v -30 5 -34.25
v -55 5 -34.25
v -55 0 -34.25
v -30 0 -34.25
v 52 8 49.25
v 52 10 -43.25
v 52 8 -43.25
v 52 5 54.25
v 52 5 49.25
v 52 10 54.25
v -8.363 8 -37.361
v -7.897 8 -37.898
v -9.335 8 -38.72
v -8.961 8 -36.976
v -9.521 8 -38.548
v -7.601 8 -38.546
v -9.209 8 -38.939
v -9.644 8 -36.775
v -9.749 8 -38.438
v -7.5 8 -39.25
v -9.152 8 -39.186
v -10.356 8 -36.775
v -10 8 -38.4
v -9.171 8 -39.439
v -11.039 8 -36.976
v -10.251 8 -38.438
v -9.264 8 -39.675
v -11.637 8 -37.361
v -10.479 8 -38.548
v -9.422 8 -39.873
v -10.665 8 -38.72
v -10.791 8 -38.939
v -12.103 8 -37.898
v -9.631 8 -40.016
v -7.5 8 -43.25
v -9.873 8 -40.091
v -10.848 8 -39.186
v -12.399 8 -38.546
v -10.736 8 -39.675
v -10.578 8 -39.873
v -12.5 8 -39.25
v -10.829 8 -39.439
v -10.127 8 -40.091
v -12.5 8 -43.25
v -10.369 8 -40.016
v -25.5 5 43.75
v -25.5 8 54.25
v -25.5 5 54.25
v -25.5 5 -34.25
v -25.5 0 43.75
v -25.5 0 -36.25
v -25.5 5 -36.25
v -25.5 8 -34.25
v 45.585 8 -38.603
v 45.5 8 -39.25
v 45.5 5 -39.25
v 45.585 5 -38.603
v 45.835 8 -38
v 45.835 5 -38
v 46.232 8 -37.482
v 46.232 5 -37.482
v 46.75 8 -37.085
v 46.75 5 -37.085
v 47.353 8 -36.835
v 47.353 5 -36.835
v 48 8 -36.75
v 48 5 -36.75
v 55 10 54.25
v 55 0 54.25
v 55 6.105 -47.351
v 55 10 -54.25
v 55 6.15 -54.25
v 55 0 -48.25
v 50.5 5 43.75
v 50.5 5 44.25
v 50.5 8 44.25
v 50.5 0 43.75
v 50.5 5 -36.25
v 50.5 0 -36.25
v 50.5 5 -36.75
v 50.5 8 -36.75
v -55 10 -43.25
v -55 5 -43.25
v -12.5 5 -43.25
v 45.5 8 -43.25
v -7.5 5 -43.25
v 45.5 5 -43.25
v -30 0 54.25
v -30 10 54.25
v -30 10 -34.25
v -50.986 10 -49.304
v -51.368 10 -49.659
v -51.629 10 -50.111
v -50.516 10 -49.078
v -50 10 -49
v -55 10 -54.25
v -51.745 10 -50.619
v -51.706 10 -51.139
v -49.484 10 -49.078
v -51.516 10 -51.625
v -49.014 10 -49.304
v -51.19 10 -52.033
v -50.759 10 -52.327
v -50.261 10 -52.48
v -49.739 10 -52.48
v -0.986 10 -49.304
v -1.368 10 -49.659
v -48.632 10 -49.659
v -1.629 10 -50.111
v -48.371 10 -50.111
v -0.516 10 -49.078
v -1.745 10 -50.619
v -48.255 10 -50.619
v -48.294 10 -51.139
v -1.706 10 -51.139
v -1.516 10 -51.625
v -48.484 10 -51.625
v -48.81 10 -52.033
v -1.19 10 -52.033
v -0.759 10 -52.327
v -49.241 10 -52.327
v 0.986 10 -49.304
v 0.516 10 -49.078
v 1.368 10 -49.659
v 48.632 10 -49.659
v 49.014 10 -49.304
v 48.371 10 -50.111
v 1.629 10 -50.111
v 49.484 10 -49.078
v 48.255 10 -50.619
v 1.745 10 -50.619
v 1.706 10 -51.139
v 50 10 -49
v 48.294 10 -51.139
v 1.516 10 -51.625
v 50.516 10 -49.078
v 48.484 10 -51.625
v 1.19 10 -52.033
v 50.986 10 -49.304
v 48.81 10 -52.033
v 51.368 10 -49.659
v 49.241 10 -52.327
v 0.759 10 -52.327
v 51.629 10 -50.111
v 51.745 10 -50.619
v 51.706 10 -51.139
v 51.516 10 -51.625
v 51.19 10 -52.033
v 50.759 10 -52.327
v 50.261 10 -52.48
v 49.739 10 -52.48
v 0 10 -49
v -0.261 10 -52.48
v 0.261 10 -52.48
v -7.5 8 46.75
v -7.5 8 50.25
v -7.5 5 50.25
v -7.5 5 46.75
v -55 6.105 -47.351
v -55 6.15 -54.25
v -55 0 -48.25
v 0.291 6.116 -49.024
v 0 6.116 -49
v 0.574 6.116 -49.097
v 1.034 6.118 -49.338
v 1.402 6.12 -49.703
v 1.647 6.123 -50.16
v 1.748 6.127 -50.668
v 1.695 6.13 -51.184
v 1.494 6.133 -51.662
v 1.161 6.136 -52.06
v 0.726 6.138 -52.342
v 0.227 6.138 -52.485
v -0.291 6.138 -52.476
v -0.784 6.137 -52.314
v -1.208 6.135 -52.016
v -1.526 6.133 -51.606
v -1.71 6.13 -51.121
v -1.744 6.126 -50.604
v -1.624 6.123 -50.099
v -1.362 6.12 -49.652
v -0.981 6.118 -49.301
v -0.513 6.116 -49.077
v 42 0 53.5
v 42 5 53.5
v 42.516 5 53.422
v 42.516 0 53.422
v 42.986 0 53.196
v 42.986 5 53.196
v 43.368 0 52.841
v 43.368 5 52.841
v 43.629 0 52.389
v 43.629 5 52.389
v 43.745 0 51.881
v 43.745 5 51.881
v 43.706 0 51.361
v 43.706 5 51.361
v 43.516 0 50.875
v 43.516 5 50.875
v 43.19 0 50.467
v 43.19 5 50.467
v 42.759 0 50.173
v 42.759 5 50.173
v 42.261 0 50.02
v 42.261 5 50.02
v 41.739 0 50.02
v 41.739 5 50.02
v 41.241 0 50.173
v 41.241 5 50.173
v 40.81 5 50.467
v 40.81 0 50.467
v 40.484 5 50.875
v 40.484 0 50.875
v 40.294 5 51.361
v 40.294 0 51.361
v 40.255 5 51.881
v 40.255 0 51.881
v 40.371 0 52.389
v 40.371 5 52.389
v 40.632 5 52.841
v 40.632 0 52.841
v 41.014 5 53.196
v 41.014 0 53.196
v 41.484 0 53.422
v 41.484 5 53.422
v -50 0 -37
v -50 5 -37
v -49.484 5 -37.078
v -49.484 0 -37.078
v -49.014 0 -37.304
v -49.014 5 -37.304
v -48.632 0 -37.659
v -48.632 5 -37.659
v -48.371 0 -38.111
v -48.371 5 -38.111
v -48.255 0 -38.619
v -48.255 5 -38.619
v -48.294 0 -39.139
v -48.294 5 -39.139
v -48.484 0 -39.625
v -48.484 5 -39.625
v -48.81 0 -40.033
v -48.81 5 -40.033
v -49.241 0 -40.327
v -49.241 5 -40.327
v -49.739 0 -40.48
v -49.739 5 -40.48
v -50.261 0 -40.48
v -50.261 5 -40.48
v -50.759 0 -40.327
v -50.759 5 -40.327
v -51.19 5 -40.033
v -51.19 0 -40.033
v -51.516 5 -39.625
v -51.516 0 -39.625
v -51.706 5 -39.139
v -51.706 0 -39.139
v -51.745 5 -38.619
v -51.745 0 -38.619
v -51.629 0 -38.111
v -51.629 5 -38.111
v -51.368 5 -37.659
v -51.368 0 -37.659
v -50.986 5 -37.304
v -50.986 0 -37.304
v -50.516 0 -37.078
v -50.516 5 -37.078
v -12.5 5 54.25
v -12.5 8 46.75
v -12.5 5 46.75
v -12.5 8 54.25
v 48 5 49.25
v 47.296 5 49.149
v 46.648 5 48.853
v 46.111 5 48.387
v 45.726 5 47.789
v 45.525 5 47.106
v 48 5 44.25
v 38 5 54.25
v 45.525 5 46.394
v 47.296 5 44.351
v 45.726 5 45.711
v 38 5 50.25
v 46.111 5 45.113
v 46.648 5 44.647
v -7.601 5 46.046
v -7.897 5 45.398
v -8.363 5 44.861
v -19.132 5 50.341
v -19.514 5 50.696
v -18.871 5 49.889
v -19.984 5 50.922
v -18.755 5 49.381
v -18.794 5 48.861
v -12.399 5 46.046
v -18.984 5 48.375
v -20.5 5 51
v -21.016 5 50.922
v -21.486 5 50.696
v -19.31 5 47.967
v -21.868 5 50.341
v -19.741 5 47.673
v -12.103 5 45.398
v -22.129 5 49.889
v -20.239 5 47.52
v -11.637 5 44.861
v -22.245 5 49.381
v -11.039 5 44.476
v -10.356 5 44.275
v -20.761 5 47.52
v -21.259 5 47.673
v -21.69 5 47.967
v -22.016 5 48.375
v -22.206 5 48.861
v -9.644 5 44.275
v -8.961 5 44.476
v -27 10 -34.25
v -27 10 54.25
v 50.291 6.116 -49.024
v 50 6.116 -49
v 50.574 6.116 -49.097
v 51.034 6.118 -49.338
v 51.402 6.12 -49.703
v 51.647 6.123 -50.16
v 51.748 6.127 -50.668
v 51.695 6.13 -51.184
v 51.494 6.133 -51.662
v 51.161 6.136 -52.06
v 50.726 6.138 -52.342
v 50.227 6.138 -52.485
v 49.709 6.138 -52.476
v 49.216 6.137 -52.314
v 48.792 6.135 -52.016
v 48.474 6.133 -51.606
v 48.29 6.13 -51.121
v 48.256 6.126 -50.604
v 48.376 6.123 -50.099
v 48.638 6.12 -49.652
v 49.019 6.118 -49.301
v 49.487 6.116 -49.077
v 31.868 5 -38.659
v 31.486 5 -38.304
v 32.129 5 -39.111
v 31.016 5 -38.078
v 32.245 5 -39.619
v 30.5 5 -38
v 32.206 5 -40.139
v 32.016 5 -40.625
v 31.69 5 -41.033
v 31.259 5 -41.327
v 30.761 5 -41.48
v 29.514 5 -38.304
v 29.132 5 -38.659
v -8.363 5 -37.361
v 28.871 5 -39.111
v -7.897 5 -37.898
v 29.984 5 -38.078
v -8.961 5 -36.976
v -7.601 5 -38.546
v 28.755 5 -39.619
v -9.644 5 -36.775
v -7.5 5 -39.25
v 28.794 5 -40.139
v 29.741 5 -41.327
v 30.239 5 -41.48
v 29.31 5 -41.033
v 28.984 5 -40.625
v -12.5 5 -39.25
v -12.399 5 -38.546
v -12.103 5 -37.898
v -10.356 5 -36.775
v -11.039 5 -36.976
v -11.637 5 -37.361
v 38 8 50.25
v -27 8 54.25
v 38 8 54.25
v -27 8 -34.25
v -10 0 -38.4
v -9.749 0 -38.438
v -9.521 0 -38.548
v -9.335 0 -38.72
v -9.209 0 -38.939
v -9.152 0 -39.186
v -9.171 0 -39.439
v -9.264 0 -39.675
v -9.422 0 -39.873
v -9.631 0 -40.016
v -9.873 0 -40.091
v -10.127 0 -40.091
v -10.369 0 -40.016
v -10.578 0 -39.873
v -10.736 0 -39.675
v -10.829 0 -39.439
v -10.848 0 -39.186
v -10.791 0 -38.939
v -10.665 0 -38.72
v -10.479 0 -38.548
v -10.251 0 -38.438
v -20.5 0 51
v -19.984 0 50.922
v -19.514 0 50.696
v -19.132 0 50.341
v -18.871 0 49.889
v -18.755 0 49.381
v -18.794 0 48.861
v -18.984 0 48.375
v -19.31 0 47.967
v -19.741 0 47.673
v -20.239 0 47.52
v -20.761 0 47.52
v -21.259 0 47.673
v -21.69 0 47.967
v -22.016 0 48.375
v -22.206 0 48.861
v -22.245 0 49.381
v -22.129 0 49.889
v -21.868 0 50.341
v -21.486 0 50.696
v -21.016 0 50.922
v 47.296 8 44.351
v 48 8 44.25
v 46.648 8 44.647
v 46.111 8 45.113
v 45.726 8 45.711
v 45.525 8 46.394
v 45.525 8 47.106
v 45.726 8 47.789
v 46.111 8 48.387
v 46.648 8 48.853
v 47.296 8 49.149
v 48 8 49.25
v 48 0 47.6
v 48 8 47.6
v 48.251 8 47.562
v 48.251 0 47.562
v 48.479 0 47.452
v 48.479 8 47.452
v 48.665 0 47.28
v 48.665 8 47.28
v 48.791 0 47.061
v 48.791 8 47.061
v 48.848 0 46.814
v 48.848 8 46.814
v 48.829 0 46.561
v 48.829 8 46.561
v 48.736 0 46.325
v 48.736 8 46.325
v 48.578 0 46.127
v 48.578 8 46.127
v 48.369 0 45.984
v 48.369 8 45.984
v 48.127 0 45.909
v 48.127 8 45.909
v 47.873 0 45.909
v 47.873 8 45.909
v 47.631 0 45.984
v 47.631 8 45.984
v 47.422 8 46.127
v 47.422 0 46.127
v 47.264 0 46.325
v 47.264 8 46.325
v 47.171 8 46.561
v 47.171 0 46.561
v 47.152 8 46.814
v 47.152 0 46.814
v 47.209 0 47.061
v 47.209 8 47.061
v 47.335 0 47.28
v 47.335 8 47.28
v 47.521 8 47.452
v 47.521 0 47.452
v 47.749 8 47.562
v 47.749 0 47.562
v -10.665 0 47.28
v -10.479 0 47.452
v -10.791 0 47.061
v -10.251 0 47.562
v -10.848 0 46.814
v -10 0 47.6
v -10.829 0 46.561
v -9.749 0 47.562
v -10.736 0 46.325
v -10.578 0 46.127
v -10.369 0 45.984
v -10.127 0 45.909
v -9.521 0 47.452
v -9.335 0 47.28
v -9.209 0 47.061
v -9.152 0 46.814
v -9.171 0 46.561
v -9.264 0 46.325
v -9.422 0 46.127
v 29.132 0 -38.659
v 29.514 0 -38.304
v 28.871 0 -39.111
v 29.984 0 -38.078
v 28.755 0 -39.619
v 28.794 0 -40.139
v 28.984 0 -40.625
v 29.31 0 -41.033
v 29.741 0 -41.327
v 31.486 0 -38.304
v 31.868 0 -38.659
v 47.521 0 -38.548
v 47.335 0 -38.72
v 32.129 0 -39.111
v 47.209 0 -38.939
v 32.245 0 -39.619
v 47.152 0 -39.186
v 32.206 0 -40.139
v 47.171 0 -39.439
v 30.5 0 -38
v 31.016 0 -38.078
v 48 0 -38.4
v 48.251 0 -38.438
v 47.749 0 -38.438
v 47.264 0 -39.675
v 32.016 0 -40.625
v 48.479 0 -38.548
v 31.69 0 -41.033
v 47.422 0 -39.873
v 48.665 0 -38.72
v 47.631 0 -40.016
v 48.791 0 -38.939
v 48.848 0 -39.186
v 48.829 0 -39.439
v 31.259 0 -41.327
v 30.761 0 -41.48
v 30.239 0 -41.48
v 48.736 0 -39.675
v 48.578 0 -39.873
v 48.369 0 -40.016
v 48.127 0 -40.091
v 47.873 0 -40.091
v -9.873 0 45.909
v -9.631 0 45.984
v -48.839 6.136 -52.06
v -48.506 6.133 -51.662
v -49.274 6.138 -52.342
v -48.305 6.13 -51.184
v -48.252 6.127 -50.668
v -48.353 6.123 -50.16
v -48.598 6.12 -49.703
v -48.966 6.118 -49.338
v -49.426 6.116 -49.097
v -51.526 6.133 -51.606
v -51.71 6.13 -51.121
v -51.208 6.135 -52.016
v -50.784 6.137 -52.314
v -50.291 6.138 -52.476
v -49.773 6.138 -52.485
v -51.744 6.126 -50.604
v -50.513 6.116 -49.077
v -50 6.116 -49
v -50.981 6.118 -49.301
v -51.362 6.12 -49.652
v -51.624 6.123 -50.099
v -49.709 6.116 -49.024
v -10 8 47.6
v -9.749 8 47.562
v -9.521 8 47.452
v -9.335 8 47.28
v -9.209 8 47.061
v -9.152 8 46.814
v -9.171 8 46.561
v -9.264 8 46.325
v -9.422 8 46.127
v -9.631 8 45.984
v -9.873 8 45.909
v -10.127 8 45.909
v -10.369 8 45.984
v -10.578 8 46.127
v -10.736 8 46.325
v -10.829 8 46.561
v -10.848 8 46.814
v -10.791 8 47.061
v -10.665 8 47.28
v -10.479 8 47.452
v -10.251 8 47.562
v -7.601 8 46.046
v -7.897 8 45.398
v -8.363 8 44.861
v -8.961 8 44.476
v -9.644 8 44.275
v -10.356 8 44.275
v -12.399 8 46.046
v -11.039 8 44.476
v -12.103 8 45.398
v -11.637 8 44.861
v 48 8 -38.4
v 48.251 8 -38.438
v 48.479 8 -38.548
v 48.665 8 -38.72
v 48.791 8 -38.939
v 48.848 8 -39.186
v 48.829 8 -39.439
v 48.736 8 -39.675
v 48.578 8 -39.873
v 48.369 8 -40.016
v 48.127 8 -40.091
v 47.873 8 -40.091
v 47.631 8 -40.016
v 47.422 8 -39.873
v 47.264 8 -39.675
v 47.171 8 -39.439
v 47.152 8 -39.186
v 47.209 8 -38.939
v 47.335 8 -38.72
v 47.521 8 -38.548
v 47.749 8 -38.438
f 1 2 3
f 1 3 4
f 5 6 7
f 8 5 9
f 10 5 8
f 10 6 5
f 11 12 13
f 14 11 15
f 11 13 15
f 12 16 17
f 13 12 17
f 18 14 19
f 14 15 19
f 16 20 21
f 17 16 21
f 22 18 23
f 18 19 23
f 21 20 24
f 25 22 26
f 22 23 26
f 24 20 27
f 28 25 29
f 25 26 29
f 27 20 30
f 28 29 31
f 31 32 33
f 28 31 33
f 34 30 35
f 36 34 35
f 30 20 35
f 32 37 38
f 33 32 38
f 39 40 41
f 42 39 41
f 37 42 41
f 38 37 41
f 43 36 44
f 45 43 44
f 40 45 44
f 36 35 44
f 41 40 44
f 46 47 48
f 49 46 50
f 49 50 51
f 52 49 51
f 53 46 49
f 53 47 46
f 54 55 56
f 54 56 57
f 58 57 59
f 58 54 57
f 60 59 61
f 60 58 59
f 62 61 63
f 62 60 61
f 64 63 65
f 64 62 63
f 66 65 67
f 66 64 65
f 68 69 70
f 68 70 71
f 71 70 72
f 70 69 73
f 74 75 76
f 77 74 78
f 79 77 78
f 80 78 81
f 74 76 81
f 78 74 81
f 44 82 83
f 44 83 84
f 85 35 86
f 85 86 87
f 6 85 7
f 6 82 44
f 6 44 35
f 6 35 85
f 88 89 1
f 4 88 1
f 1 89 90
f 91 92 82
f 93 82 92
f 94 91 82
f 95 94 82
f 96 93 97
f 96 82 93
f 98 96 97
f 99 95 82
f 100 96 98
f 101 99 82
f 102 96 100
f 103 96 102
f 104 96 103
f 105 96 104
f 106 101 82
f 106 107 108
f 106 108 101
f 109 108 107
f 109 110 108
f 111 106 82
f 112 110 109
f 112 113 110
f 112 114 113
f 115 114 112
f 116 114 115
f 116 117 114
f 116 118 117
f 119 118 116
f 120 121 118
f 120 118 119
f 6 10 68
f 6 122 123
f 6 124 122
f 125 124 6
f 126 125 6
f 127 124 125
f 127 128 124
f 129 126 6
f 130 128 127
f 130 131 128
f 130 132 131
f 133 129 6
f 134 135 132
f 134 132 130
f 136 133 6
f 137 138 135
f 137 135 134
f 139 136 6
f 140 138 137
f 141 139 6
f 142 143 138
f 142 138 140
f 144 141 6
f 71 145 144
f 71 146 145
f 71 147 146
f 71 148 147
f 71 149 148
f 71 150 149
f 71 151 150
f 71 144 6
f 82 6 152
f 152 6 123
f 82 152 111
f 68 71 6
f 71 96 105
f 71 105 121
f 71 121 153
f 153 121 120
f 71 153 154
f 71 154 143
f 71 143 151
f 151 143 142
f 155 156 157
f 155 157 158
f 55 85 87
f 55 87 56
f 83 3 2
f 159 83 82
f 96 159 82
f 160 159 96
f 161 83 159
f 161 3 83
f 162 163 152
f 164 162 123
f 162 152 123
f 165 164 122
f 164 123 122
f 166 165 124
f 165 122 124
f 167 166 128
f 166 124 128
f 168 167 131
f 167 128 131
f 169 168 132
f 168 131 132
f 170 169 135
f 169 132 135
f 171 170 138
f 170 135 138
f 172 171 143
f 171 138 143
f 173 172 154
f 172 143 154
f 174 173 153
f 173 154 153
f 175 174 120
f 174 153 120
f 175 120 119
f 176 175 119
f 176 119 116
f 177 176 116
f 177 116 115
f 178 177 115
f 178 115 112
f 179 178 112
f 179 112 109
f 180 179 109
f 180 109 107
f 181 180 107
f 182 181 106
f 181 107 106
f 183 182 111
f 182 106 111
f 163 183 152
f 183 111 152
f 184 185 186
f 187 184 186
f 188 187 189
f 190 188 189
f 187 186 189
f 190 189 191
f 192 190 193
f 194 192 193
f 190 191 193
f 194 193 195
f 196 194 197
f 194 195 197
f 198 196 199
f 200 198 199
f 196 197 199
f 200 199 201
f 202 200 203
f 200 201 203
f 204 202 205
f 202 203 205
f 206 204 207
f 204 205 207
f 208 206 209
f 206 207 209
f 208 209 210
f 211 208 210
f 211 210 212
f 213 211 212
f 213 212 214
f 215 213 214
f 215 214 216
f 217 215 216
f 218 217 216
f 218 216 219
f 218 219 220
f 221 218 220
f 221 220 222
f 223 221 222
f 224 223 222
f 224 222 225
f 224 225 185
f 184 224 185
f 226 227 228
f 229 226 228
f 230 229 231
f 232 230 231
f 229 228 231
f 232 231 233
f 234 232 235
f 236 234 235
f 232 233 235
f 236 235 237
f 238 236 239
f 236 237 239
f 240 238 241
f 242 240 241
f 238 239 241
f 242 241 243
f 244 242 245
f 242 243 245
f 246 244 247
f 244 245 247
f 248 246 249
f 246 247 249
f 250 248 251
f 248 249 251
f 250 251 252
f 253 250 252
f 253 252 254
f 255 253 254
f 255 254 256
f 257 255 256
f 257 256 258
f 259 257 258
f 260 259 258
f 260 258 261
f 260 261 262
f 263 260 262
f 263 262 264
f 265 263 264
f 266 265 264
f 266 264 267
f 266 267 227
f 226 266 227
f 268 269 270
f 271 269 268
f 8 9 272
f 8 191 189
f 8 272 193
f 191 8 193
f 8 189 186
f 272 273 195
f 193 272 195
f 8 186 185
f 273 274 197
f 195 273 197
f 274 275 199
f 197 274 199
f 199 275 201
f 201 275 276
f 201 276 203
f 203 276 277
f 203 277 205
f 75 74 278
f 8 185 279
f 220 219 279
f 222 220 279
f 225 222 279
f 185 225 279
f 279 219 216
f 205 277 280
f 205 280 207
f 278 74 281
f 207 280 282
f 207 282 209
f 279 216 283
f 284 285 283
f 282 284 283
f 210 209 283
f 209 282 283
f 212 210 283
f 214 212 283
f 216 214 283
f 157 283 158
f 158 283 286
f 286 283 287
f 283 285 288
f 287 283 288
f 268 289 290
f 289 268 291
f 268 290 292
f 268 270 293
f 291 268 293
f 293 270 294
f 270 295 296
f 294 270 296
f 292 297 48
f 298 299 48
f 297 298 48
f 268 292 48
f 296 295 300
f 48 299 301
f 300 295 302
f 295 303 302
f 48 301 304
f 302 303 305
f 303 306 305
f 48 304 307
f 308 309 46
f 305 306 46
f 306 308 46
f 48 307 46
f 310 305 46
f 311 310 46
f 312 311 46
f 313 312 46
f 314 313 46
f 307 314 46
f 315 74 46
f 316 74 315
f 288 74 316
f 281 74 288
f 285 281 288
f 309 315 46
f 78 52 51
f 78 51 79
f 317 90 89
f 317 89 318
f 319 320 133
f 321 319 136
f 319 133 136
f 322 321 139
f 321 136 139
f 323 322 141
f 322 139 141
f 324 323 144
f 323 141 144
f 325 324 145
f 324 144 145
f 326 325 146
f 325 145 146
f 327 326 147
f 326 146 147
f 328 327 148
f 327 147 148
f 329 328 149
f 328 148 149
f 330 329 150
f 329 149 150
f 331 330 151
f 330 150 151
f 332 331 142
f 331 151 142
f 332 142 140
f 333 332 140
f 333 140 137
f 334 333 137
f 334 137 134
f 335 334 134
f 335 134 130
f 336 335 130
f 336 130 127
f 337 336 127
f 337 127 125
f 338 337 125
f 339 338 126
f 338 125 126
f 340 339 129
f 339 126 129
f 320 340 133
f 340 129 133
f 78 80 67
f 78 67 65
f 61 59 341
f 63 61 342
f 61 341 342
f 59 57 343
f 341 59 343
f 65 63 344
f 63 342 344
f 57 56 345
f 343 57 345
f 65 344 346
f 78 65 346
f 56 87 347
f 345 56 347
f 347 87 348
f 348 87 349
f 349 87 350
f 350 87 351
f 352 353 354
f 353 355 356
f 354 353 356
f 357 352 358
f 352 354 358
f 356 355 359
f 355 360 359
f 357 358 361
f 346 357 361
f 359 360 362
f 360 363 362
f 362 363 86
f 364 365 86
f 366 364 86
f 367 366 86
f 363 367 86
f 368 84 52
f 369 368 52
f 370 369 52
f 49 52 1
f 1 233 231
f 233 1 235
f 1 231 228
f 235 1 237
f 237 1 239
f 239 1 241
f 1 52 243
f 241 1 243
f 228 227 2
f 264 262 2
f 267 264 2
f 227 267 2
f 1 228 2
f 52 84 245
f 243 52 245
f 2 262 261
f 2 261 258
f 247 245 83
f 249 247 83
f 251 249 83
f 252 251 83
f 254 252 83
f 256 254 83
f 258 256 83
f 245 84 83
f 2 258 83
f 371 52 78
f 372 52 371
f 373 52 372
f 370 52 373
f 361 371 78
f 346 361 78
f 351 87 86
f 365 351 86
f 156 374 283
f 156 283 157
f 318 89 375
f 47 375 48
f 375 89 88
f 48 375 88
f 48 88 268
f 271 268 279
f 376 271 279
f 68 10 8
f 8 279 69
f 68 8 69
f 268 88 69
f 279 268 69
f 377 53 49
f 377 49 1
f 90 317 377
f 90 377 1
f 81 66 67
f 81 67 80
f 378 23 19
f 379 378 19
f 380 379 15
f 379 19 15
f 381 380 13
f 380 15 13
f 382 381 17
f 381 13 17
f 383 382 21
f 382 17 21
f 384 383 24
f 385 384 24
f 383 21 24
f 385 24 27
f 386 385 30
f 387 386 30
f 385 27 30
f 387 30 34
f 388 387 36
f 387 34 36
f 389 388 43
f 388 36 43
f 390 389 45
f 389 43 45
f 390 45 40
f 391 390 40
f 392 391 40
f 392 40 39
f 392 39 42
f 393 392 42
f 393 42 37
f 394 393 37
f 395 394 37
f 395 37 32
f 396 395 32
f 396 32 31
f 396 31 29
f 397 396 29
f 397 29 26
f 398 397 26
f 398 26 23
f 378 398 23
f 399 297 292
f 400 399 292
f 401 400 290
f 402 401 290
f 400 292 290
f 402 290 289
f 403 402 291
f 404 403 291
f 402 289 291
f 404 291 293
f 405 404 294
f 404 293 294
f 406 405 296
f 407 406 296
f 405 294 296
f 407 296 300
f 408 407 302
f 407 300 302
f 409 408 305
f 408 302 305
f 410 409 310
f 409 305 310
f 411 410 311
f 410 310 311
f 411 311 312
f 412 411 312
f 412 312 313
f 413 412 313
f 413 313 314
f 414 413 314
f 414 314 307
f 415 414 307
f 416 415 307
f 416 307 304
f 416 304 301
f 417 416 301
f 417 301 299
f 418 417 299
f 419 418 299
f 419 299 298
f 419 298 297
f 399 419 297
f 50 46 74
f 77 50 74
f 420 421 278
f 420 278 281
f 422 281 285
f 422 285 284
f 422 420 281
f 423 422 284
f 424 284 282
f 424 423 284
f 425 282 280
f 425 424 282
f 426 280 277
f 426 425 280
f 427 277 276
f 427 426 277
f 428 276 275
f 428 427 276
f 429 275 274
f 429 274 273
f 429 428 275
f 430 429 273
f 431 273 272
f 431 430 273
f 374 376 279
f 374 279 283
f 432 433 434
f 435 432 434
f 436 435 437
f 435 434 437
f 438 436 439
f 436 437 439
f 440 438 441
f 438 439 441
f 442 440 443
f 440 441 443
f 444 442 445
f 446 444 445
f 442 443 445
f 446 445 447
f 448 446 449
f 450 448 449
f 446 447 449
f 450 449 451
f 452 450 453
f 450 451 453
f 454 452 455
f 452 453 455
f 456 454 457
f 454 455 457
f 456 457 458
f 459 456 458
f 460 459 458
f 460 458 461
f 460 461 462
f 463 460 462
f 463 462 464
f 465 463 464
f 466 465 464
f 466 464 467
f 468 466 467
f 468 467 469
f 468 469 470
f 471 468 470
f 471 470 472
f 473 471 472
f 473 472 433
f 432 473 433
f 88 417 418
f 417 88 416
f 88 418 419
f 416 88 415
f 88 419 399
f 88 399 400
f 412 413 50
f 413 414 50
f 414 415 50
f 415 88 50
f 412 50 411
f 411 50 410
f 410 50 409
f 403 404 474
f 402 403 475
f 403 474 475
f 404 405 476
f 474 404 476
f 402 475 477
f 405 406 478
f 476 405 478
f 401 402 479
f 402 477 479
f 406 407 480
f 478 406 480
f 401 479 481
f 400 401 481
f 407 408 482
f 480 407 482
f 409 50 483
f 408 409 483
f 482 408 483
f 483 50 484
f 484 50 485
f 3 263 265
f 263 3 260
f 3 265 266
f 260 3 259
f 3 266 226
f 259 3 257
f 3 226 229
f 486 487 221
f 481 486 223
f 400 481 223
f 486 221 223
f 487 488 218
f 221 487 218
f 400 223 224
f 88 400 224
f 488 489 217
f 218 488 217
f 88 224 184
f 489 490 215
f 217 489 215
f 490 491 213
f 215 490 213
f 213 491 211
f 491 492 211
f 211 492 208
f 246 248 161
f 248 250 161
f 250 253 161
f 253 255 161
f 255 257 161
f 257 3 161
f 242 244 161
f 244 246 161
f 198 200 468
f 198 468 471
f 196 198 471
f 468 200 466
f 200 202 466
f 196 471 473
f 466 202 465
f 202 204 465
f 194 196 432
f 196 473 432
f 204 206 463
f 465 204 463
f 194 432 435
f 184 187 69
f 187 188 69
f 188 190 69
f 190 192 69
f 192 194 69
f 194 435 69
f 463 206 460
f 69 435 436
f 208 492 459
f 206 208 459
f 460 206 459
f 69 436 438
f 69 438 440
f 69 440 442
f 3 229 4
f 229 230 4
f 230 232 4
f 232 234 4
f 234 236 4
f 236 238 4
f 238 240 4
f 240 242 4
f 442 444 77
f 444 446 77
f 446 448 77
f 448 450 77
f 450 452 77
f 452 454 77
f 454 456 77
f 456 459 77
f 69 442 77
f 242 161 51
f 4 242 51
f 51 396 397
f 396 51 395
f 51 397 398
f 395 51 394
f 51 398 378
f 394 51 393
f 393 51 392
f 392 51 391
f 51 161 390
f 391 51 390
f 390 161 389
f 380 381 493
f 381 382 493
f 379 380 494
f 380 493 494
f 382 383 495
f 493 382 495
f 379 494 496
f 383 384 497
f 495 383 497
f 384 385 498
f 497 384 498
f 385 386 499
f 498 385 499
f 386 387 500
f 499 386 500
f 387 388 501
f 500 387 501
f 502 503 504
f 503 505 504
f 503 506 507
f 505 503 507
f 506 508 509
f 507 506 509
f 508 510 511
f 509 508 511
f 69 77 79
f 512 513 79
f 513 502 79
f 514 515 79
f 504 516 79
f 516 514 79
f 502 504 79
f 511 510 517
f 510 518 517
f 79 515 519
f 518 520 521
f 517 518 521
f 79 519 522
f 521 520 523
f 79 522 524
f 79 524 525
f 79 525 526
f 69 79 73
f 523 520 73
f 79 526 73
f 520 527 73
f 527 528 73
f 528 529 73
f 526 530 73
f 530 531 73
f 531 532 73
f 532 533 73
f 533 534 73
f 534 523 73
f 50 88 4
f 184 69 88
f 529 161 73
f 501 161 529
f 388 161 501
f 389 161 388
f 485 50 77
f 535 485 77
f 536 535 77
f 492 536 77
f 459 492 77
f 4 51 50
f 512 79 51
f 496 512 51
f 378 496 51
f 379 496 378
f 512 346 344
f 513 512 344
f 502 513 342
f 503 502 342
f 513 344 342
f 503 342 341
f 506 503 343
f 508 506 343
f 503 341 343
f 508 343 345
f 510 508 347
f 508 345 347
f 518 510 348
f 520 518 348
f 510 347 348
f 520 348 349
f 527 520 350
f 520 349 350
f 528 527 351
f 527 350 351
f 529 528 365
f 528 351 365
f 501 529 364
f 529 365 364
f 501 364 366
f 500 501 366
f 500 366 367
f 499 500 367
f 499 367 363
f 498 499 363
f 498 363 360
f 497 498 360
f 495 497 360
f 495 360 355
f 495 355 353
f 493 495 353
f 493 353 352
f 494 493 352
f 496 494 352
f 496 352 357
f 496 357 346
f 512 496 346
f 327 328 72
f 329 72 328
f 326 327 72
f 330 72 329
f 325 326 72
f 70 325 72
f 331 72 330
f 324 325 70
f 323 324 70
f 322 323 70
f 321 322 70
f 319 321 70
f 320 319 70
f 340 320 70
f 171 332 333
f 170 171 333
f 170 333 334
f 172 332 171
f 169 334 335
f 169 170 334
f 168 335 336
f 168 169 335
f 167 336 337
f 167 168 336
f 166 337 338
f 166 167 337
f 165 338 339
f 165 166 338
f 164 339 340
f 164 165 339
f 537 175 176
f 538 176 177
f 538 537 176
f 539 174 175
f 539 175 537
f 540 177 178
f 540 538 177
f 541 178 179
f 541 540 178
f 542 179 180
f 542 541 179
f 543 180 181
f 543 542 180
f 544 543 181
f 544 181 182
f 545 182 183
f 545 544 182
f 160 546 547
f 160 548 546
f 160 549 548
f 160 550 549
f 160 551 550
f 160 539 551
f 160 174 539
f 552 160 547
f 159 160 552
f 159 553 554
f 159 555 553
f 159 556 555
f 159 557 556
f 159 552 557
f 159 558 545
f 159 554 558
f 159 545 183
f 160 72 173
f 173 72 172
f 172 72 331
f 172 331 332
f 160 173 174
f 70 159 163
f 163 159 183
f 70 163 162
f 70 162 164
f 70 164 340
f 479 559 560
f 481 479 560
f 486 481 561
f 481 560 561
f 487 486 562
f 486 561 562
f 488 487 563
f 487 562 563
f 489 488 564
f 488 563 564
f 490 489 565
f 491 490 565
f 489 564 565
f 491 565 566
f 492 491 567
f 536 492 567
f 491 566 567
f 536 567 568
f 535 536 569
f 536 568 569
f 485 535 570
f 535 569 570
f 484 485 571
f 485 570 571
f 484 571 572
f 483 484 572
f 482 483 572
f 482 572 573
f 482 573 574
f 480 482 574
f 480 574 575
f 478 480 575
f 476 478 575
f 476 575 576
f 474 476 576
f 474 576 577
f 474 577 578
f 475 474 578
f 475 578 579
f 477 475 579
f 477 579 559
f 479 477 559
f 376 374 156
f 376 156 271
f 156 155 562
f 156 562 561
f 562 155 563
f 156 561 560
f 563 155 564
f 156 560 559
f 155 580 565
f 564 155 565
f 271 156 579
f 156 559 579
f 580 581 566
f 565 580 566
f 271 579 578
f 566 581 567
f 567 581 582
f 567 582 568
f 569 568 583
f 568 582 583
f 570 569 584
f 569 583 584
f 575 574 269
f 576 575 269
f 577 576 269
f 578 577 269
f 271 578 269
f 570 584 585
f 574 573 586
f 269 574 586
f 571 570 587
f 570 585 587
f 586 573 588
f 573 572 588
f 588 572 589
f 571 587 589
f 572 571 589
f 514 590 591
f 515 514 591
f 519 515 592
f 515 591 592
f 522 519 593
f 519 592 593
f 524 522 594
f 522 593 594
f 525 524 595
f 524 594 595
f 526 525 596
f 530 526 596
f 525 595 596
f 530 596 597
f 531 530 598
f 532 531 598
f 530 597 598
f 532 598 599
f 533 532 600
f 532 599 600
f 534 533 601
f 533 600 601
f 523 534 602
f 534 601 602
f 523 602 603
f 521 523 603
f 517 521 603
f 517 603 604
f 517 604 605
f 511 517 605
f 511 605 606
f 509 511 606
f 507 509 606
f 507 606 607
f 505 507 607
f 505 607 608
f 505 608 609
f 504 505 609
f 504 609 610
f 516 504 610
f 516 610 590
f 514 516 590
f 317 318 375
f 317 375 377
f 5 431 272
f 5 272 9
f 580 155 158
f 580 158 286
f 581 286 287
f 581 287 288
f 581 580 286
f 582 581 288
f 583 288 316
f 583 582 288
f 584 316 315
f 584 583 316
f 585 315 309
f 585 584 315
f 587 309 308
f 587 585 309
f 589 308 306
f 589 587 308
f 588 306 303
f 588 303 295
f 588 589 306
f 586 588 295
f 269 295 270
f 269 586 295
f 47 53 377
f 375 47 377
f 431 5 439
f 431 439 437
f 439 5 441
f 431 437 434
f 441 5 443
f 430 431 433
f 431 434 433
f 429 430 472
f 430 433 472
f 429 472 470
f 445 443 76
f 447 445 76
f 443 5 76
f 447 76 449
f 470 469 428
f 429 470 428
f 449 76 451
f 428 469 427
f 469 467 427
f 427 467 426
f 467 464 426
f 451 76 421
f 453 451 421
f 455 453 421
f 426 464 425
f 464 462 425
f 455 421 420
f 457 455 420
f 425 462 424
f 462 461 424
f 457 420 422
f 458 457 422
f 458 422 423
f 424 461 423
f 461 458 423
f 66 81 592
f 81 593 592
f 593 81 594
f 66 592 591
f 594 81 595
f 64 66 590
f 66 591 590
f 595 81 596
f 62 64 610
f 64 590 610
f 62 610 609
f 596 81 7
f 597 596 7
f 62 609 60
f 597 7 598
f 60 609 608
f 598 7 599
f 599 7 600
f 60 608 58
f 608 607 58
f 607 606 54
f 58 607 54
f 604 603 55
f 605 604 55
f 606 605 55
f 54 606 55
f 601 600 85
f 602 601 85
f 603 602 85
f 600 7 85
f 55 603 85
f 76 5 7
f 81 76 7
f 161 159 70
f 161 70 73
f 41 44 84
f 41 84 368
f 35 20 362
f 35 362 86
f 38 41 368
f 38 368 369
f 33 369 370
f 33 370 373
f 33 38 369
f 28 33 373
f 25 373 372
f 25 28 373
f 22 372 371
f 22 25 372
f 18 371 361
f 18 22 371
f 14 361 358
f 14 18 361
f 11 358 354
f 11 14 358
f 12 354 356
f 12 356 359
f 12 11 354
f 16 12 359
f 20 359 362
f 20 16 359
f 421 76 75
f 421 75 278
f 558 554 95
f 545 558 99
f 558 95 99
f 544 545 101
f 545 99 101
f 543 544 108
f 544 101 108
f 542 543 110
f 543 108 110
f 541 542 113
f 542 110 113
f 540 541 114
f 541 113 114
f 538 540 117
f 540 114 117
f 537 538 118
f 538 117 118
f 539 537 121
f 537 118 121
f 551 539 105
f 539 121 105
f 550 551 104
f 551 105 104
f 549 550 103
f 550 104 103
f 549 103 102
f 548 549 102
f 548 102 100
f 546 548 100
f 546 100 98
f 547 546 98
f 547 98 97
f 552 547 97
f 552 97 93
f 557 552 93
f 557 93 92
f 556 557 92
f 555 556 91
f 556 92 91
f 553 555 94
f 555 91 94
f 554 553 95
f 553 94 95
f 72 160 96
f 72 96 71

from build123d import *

# Parameters (mm, degrees)
SKETCH_2_W          = 110
SKETCH_2_H          = 108.5
EXTRUDE_1_DEPTH     = 10
CUT_EXTRUDE_1_DEPTH = 124.057151357
SKETCH_4_W          = 25
SKETCH_4_H          = 88.5
CUT_EXTRUDE_2_DEPTH = 78.897769544
CUT_EXTRUDE_3_DEPTH = 2
SKETCH_6_W          = 76
SKETCH_6_H          = 80
CUT_EXTRUDE_4_DEPTH = 78.666353719
CUT_EXTRUDE_5_DEPTH = 3
SKETCH_8_R          = 0.85
SKETCH_8_R_2        = 1.75
CUT_EXTRUDE_6_DEPTH = 78.666353719
SKETCH_9_R          = 1.75
CUT_EXTRUDE_7_DEPTH = 78.897769544


with BuildPart() as part:
    # 스케치2 → 보스-돌출1 (new body)
    with BuildSketch(Plane(origin=(0, 0, 0), x_dir=(1, 0, 0), z_dir=(0, 1, 0))):
        Rectangle(SKETCH_2_W, SKETCH_2_H)
    extrude(amount=EXTRUDE_1_DEPTH)

    # 스케치3 → 컷-돌출1 (cut, through all)
    with BuildSketch(Plane.ZY.offset(55)):
        Polygon((-54.25, 6.15), (-47.351234773, 6.104845063), (-48.25, 0), (-54.25, 0), align=None)
    extrude(amount=-CUT_EXTRUDE_1_DEPTH, mode=Mode.SUBTRACT)

    # 스케치4 → 컷-돌출2 (cut, through all)
    with BuildSketch(Plane(origin=(0, 10, 0), x_dir=(1, 0, 0), z_dir=(0, 1, 0))):
        with Locations((-42.5, -10)):
            Rectangle(SKETCH_4_W, SKETCH_4_H)
    extrude(amount=-CUT_EXTRUDE_2_DEPTH, mode=Mode.SUBTRACT)

    # 스케치5 → 컷-돌출3 (cut)
    with BuildSketch(Plane(origin=(0, 10, 0), x_dir=(1, 0, 0), z_dir=(0, 1, 0))):
        Polygon((52, -54.25), (-27, -54.25), (-27, 34.25), (-55, 34.25), (-55, 43.25), (52, 43.25), align=None)
    extrude(amount=-CUT_EXTRUDE_3_DEPTH, mode=Mode.SUBTRACT)

    # 스케치6 → 컷-돌출4 (cut, through all)
    with BuildSketch(Plane(origin=(0, 8, 0), x_dir=(1, 0, 0), z_dir=(0, 1, 0))):
        with Locations((12.5, -3.75)):
            Rectangle(SKETCH_6_W, SKETCH_6_H)
    extrude(amount=-CUT_EXTRUDE_4_DEPTH, mode=Mode.SUBTRACT)

    # 스케치7 → 컷-돌출5 (cut)
    with BuildSketch(Plane(origin=(0, 8, 0), x_dir=(1, 0, 0), z_dir=(0, 1, 0))):
        with BuildLine():
            Line((52, -54.25), (38, -54.25))
            Line((38, -54.25), (38, -50.25))
            Line((38, -50.25), (-7.5, -50.25))
            Line((-7.5, -50.25), (-7.5, -46.75))
            ThreePointArc((-7.5, -46.75), (-10, -44.25), (-12.5, -46.75))
            Line((-12.5, -46.75), (-12.5, -54.25))
            Line((-12.5, -54.25), (-25.5, -54.25))
            Line((-25.5, -54.25), (-25.5, 34.25))
            Line((-25.5, 34.25), (-55, 34.25))
            Line((-55, 34.25), (-55, 43.25))
            Line((-55, 43.25), (-12.5, 43.25))
            Line((-12.5, 43.25), (-12.5, 39.25))
            ThreePointArc((-12.5, 39.25), (-10, 36.75), (-7.5, 39.25))
            Line((-7.5, 39.25), (-7.5, 43.25))
            Line((-7.5, 43.25), (45.5, 43.25))
            Line((45.5, 43.25), (45.5, 39.25))
            ThreePointArc((45.5, 39.25), (46.232233047, 37.482233047), (48, 36.75))
            Line((48, 36.75), (50.5, 36.75))
            Line((50.5, 36.75), (50.5, -44.25))
            Line((50.5, -44.25), (48, -44.25))
            ThreePointArc((48, -44.25), (45.5, -46.75), (48, -49.25))
            Line((48, -49.25), (52, -49.25))
            Line((52, -49.25), (52, -54.25))
        make_face()
    extrude(amount=-CUT_EXTRUDE_5_DEPTH, mode=Mode.SUBTRACT)

    # 스케치8 → 컷-돌출6 (cut, through all)
    with BuildSketch(Plane(origin=(0, 8, 0), x_dir=(1, 0, 0), z_dir=(0, 1, 0))):
        with Locations(Location((-10, 39.25, 0), (0, 0, 270))):
            Circle(SKETCH_8_R)
        with Locations(Location((48, 39.25, 0), (0, 0, 270))):
            Circle(SKETCH_8_R)
        with Locations(Location((-10, -46.75, 0), (0, 0, 270))):
            Circle(SKETCH_8_R)
        with Locations(Location((48, -46.75, 0), (0, 0, 270))):
            Circle(SKETCH_8_R)
        with Locations(Location((-50, 38.75, 0), (0, 0, 270))):
            Circle(SKETCH_8_R_2)
        with Locations(Location((30.5, 39.75, 0), (0, 0, 270))):
            Circle(SKETCH_8_R_2)
        with Locations(Location((42, -51.75, 0), (0, 0, 270))):
            Circle(SKETCH_8_R_2)
        with Locations(Location((-20.5, -49.25, 0), (0, 0, 270))):
            Circle(SKETCH_8_R_2)
    extrude(amount=-CUT_EXTRUDE_6_DEPTH, mode=Mode.SUBTRACT)

    # 스케치9 → 컷-돌출7 (cut, through all)
    with BuildSketch(Plane(origin=(0, 10, 0), x_dir=(1, 0, 0), z_dir=(0, 1, 0))):
        with Locations(Location((-50, 50.75, 0), (0, 0, 270))):
            Circle(SKETCH_9_R)
        with Locations(Location((0, 50.75, 0), (0, 0, 270))):
            Circle(SKETCH_9_R)
        with Locations(Location((50, 50.75, 0), (0, 0, 270))):
            Circle(SKETCH_9_R)
    extrude(amount=-CUT_EXTRUDE_7_DEPTH, mode=Mode.SUBTRACT)


solid = part.part
